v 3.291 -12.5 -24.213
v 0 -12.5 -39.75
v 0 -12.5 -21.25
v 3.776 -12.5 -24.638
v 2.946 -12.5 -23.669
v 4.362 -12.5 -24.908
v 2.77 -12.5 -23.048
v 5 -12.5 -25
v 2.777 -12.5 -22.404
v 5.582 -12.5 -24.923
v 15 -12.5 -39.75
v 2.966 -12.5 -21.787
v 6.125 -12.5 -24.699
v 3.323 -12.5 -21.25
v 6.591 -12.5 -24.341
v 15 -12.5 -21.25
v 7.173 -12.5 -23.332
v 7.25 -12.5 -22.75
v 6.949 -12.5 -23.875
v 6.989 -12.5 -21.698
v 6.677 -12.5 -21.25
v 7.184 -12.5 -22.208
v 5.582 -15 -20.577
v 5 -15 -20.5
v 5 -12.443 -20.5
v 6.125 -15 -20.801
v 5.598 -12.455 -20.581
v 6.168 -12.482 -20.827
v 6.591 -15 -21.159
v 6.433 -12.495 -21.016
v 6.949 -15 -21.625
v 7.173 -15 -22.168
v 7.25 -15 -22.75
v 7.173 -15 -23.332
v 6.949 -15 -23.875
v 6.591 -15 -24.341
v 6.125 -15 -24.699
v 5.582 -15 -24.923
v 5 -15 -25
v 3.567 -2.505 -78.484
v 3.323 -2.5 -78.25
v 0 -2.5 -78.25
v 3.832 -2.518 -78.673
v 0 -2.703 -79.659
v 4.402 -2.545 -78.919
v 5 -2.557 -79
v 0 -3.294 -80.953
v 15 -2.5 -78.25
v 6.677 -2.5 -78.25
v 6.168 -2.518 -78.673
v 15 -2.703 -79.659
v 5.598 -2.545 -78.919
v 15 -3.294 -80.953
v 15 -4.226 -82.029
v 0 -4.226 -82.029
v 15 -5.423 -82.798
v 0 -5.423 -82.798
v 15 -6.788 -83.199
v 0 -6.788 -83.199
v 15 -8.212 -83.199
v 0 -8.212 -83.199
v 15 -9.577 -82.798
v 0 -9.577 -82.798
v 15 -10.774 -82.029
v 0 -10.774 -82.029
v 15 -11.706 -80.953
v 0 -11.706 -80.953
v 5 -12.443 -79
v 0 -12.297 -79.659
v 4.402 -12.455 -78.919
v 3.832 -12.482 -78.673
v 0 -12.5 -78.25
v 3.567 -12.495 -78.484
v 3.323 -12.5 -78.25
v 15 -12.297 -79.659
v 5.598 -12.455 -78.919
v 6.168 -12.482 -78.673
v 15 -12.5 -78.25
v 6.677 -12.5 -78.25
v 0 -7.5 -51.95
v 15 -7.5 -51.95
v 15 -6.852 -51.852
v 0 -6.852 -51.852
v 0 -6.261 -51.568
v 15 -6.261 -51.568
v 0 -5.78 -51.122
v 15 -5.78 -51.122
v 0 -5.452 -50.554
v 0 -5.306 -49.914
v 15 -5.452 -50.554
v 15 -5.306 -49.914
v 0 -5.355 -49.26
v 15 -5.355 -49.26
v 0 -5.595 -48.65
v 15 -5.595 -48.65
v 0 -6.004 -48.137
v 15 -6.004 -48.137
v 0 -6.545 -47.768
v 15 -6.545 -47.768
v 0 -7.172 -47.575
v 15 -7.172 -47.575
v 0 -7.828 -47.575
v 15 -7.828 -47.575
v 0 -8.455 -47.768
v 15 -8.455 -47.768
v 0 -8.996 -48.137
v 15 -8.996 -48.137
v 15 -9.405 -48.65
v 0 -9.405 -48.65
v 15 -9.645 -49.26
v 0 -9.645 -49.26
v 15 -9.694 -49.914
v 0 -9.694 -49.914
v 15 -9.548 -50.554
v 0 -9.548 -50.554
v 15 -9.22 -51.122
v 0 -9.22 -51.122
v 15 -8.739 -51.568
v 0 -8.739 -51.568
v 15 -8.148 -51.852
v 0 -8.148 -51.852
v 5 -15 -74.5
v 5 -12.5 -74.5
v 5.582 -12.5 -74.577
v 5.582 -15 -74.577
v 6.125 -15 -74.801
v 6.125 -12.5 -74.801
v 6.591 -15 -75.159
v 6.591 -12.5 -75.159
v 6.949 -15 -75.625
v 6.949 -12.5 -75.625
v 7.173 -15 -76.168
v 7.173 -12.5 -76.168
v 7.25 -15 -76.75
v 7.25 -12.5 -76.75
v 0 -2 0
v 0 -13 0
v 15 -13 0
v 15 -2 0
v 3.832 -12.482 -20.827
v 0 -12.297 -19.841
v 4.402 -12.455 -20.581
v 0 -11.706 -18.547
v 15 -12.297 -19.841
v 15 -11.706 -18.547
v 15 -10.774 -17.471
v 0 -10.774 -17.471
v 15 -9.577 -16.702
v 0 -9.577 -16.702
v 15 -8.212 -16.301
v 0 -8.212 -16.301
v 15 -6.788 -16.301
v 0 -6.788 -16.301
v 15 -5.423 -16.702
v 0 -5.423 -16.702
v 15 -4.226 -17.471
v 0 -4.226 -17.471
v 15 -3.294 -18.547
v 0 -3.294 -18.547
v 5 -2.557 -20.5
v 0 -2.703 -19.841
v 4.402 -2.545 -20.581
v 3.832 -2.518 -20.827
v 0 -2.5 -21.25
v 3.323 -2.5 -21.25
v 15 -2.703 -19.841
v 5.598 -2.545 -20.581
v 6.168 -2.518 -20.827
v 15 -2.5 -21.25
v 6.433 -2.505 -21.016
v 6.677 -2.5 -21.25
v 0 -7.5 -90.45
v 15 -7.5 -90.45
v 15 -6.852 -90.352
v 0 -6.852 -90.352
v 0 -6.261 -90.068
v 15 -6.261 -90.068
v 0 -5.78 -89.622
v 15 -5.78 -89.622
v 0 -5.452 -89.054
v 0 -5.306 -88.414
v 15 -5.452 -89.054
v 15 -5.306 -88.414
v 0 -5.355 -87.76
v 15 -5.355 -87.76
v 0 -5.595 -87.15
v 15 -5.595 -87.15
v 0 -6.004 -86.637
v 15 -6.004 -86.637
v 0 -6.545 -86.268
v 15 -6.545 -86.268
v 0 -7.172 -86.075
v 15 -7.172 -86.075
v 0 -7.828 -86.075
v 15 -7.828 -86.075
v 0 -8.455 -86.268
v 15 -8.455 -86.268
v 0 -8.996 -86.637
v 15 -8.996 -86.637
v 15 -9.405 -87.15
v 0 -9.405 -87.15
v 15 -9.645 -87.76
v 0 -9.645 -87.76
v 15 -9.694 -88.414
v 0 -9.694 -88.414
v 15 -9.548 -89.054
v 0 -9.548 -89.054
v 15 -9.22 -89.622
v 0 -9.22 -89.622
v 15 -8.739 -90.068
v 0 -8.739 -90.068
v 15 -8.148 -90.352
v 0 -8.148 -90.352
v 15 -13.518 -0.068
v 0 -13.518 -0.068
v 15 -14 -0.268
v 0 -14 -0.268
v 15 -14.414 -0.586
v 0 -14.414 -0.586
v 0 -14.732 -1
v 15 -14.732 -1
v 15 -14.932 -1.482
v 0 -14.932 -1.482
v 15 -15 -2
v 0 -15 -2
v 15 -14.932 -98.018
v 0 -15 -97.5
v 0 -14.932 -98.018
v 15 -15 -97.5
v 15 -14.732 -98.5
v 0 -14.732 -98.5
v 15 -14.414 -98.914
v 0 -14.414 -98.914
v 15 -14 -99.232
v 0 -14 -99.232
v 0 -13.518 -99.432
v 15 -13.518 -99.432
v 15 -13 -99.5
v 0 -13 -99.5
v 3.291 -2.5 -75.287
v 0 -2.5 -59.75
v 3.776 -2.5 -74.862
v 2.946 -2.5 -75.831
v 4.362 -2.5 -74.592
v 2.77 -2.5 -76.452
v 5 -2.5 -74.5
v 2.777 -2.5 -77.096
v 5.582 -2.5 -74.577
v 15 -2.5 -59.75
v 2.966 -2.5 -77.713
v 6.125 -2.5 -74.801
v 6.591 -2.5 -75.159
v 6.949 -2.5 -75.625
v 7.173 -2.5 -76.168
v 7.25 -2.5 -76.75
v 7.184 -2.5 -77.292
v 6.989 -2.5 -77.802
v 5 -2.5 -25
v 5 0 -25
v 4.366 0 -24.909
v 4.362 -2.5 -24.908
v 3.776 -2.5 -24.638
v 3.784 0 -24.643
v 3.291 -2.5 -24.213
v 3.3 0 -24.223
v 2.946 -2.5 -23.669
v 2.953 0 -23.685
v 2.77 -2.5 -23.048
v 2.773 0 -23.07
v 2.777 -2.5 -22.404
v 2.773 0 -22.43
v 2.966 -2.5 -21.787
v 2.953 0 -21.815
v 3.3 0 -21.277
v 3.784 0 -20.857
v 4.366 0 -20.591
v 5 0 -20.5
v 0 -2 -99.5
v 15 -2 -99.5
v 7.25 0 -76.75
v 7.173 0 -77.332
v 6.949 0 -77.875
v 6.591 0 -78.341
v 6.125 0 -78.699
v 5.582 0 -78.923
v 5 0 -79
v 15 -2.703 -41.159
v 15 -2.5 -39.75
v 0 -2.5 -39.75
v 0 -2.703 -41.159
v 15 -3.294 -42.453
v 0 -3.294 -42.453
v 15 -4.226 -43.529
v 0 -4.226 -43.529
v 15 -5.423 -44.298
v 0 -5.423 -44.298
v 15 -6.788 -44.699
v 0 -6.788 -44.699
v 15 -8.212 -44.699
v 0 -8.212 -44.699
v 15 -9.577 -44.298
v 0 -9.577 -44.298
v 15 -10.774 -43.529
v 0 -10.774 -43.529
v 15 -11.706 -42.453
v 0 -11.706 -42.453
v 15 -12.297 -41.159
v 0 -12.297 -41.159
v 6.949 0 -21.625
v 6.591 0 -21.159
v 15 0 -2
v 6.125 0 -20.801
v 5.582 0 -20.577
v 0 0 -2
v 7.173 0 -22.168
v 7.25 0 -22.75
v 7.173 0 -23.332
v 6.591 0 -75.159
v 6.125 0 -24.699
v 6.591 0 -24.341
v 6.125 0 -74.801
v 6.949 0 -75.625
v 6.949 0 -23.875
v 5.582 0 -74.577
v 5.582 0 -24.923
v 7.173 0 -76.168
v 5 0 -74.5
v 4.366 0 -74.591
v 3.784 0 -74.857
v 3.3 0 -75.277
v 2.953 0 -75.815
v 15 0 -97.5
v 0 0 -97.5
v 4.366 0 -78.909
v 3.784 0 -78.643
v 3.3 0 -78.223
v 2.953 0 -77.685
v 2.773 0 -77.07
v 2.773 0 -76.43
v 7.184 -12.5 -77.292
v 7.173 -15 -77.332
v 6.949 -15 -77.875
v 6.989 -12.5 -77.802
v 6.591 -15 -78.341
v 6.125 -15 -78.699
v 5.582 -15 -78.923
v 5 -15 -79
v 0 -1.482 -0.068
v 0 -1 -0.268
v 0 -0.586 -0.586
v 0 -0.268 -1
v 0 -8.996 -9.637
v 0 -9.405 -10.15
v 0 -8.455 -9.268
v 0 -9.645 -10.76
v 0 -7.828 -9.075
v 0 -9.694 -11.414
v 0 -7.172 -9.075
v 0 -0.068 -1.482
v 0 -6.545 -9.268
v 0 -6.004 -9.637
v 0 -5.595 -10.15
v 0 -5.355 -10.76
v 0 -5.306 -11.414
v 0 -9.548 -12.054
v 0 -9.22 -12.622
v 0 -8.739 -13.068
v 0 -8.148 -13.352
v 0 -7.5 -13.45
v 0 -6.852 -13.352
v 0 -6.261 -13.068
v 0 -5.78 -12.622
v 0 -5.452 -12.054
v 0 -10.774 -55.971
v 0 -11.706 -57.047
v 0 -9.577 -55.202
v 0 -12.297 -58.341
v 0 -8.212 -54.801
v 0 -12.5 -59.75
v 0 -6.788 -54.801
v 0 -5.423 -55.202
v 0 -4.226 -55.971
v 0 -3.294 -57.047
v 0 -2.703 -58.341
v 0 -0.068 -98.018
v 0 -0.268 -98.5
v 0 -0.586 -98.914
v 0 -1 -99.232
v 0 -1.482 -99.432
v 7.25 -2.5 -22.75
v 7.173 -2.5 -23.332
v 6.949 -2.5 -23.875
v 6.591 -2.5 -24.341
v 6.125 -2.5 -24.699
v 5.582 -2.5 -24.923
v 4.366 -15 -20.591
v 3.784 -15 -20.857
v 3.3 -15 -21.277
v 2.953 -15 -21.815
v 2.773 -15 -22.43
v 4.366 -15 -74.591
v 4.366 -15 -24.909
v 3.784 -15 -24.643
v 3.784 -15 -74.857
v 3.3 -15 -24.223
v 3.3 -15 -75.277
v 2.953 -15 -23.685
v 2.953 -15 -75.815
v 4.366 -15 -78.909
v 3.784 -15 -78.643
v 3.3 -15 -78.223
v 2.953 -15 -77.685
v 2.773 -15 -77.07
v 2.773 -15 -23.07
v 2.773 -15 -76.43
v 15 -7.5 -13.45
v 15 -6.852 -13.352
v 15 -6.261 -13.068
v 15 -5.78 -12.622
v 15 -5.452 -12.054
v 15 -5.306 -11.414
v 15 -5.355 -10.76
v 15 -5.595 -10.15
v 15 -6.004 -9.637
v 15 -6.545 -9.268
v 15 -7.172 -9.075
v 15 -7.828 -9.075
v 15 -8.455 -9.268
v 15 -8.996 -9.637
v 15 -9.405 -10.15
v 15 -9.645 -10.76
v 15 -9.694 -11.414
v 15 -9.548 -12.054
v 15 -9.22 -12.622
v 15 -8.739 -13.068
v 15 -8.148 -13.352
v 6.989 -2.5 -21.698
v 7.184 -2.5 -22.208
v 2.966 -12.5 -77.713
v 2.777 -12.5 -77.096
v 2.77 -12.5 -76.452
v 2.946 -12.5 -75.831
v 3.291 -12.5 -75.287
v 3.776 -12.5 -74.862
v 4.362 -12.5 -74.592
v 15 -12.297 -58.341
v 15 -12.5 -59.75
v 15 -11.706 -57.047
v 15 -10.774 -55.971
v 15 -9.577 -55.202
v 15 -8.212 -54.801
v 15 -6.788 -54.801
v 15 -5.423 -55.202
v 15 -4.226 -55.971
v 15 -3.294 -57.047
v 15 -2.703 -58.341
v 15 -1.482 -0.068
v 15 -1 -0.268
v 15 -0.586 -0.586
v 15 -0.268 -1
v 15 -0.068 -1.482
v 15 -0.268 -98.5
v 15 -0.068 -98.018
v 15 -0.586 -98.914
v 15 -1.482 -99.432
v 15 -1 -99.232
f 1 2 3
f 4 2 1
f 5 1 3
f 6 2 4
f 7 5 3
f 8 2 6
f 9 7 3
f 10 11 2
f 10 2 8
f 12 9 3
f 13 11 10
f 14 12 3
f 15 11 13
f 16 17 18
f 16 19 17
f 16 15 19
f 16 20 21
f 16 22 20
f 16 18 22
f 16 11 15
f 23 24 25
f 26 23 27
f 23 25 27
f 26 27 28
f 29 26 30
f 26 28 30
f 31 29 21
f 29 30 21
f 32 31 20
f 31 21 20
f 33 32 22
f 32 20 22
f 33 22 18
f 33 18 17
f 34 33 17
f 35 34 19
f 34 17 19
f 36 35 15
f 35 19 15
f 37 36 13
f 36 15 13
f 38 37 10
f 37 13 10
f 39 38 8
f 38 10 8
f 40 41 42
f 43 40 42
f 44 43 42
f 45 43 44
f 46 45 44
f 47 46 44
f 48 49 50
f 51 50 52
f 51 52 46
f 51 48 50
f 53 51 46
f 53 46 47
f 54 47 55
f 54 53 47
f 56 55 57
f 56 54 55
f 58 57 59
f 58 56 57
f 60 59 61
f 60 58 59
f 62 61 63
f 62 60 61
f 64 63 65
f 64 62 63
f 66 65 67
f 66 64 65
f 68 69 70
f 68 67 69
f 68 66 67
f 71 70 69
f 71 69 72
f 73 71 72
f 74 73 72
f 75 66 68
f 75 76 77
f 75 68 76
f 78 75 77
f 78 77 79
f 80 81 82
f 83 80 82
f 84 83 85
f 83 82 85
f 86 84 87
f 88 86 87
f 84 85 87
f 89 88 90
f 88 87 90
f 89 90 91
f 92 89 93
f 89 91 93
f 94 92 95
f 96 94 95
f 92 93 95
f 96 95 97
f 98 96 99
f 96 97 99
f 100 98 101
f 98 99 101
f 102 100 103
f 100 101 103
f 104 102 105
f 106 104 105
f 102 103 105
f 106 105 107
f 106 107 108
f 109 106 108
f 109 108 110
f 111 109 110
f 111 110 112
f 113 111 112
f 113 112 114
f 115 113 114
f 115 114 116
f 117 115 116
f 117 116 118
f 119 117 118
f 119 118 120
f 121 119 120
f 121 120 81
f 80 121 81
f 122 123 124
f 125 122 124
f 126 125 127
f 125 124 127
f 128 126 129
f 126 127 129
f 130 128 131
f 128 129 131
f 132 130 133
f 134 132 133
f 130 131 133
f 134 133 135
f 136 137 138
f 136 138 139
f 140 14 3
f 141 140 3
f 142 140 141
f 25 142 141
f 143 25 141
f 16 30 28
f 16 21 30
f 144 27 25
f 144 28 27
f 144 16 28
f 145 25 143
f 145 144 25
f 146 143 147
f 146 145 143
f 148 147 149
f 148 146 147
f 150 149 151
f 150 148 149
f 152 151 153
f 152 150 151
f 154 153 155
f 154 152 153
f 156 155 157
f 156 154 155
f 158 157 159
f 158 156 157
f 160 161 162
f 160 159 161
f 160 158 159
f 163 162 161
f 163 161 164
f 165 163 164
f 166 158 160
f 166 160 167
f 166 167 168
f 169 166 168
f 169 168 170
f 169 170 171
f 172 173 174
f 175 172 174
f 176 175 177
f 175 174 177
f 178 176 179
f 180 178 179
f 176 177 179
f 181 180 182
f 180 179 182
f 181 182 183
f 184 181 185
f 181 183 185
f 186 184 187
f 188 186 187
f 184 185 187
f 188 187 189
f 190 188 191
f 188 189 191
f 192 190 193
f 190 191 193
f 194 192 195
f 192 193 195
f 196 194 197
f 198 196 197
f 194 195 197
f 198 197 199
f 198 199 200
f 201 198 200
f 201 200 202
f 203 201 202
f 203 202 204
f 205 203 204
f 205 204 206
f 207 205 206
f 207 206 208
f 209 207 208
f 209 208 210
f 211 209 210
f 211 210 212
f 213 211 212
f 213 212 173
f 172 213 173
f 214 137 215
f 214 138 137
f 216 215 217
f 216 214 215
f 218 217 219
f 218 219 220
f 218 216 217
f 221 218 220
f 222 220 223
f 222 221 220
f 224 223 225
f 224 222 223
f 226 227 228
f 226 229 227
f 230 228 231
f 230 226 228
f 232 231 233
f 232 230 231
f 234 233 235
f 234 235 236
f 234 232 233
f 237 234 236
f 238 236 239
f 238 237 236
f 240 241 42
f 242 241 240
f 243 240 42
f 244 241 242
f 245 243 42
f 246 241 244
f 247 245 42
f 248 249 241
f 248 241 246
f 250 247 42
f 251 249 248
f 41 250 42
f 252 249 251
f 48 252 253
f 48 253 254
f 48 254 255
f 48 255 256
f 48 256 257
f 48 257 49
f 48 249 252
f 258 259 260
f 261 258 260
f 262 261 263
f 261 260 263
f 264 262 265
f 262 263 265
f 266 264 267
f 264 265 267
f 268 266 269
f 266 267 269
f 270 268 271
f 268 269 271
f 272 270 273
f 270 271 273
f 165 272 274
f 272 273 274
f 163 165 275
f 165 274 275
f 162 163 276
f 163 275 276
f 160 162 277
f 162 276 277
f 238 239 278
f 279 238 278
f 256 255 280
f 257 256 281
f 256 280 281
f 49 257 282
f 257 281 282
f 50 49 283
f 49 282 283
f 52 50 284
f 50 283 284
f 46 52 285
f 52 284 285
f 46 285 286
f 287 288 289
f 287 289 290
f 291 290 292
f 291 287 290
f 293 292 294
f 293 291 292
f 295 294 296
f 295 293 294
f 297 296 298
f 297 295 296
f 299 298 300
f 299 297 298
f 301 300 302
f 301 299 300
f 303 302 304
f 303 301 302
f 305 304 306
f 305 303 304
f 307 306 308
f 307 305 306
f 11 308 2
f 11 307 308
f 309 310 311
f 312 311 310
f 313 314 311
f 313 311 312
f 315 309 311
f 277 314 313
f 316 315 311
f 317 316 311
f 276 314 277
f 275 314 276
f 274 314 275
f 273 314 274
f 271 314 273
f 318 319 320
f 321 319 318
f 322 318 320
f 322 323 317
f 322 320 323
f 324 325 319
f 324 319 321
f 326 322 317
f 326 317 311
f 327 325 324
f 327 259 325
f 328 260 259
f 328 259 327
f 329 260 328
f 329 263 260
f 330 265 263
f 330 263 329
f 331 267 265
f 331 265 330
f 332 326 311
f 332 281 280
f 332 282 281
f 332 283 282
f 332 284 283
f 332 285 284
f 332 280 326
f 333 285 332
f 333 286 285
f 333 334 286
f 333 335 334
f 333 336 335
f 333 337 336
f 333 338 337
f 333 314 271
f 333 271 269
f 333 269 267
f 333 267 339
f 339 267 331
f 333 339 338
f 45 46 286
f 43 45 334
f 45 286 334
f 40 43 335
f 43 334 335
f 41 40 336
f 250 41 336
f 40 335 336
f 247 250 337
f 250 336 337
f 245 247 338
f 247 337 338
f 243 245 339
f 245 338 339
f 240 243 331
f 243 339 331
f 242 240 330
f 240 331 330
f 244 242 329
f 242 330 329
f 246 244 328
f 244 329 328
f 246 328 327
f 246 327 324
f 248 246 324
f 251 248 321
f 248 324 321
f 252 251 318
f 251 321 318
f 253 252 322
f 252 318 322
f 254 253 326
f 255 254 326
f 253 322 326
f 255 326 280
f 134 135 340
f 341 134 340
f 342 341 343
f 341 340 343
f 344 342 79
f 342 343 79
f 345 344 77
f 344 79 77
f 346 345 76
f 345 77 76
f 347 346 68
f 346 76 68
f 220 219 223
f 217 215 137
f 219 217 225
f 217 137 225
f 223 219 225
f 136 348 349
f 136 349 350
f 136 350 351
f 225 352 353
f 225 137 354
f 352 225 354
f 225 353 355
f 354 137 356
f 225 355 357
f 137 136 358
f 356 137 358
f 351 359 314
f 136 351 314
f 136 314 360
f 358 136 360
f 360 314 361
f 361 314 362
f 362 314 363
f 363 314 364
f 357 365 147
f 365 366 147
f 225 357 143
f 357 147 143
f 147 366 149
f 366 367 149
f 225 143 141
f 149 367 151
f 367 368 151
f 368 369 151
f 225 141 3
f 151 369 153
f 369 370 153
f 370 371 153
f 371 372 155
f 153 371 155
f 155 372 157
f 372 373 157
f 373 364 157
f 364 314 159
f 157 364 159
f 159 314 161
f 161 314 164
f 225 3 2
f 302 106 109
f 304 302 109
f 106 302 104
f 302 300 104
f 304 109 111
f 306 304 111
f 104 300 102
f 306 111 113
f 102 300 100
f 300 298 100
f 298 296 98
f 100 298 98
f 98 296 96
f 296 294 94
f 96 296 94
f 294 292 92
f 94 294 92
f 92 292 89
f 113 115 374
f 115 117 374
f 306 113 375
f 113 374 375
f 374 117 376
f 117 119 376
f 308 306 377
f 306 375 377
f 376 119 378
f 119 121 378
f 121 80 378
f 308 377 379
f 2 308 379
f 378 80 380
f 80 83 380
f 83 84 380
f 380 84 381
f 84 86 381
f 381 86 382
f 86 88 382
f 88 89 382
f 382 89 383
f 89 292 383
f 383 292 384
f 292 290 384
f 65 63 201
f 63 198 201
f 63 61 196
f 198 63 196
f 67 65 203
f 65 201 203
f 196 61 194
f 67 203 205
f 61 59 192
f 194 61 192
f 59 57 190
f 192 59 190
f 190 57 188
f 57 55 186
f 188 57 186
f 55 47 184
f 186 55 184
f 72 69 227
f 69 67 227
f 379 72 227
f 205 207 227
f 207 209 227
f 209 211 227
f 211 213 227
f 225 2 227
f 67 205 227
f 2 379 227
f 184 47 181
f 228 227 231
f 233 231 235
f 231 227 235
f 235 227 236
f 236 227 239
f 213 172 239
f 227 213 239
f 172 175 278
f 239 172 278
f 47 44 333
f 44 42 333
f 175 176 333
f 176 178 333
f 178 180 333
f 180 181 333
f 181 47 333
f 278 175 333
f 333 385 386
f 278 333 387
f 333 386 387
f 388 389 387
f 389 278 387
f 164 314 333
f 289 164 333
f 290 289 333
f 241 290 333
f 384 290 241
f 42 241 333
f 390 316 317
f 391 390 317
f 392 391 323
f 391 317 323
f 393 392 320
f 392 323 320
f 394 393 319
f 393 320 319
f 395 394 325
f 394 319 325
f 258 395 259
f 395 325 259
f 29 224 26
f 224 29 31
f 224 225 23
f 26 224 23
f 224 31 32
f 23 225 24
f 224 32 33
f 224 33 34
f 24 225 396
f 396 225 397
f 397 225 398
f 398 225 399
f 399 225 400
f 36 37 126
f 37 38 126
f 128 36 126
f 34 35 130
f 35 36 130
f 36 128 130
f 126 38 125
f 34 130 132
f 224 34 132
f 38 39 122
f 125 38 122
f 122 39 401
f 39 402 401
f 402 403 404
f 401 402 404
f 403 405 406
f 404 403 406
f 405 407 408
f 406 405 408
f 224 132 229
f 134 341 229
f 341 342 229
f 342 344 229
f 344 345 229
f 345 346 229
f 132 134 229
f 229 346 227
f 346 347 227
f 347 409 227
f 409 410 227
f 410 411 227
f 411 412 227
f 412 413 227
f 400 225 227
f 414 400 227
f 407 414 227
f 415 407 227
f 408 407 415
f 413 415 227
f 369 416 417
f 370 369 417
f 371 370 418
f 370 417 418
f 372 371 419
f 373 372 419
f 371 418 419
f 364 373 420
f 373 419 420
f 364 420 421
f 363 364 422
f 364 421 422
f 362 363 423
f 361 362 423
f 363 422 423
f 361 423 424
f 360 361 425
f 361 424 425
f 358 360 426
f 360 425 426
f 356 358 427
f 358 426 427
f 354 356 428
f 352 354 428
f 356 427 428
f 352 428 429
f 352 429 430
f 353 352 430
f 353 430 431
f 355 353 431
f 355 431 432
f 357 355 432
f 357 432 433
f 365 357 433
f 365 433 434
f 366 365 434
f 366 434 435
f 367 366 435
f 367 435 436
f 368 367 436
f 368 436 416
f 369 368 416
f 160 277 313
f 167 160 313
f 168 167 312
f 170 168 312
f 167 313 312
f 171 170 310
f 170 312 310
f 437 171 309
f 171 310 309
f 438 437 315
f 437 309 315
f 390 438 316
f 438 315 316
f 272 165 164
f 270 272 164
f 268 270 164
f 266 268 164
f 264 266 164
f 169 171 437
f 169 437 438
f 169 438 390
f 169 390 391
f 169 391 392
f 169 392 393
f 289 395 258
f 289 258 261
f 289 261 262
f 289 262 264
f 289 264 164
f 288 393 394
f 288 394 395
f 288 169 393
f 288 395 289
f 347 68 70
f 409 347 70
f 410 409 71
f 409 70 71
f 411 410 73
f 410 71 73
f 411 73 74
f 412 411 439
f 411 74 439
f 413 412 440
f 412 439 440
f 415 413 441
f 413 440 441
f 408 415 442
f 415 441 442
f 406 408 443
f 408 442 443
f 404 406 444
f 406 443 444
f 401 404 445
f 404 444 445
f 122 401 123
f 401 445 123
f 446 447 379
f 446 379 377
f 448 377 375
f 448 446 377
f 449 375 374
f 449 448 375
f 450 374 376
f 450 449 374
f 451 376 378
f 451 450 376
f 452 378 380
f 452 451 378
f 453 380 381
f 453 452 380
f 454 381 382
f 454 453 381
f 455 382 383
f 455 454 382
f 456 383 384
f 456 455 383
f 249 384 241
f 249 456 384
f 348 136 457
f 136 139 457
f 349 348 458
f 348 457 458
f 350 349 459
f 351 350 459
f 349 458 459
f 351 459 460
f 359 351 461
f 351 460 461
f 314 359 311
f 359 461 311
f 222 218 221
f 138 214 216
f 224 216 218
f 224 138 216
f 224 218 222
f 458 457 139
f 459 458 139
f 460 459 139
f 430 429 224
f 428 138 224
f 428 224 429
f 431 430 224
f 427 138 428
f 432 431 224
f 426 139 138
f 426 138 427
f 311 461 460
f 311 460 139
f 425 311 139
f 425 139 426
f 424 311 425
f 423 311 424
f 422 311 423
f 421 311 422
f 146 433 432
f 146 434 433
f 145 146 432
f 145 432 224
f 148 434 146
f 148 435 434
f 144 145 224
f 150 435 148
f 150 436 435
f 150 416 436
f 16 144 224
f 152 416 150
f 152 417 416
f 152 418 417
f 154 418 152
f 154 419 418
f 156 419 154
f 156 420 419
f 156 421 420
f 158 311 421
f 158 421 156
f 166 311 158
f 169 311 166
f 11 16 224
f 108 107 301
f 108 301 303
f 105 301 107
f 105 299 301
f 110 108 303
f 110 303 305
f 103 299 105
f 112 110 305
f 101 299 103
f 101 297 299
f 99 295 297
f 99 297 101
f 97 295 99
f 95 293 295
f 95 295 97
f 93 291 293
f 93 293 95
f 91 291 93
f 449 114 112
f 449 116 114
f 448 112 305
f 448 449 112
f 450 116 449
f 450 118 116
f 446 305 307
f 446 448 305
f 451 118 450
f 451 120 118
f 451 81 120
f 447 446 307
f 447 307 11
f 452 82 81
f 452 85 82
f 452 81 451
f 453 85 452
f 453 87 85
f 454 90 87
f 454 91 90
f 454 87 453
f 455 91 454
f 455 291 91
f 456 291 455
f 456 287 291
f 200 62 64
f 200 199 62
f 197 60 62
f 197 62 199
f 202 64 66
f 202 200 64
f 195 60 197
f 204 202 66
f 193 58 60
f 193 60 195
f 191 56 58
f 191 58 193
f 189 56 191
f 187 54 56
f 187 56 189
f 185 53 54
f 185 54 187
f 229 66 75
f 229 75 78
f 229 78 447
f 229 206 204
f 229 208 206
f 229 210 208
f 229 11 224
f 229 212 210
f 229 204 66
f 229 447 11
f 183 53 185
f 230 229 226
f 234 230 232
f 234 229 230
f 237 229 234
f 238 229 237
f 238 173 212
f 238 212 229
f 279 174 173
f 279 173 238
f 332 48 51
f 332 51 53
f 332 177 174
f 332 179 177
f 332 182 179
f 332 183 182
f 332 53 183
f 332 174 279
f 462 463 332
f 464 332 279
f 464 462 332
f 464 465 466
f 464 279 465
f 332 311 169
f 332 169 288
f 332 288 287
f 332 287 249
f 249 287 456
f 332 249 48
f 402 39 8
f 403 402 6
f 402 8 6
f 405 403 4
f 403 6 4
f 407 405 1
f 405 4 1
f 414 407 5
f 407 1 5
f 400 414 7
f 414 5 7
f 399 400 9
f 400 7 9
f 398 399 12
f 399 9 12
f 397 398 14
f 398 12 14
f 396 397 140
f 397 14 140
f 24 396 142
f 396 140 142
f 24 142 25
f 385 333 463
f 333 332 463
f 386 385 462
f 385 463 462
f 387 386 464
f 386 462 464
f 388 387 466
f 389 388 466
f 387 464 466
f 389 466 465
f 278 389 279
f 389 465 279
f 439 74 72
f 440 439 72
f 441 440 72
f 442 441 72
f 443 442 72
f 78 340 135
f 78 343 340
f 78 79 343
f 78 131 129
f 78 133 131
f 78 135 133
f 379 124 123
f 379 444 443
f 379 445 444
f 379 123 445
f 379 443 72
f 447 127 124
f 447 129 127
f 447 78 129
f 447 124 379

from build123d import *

# Parameters (mm, degrees)
SKETCH_1_W          = 99.5
SKETCH_1_H          = 15
EXTRUDE_1_DEPTH     = 15
SKETCH_2_R          = 2.2
CUT_EXTRUDE_1_DEPTH = 55
CUT_EXTRUDE_2_DEPTH = 48
FILLET_1_R          = 2
CUT_EXTRUDE_3_DEPTH = 31


with BuildPart() as part:
    # 草图1 → 凸台-拉伸1 (new body)
    with BuildSketch(Plane(origin=(0, 0, 0), x_dir=(0, 0, -1), z_dir=(1, 0, 0))):
        with Locations((49.75, -7.5)):
            Rectangle(SKETCH_1_W, SKETCH_1_H)
    extrude(amount=EXTRUDE_1_DEPTH)

    # 草图2 → 切除-拉伸1 (cut)
    with BuildSketch(Plane(origin=(15, 0, 0), x_dir=(0, 0, -1), z_dir=(1, 0, 0))):
        with Locations((49.75, -7.5)):
            Circle(SKETCH_2_R)
        with Locations((11.25, -7.5)):
            Circle(SKETCH_2_R)
        with Locations((88.25, -7.5)):
            Circle(SKETCH_2_R)
    extrude(amount=-CUT_EXTRUDE_1_DEPTH, mode=Mode.SUBTRACT)

    # 草图3 → 切除-拉伸2 (cut)
    with BuildSketch(Plane(origin=(15, 0, 0), x_dir=(0, 0, -1), z_dir=(1, 0, 0))):
        with BuildLine():
            Line((21.25, -2.5), (39.75, -2.5))
            ThreePointArc((39.75, -2.5), (44.75, -7.5), (39.75, -12.5))
            Line((39.75, -12.5), (21.25, -12.5))
            ThreePointArc((21.25, -12.5), (16.25, -7.5), (21.25, -2.5))
        make_face()
        with BuildLine():
            Line((59.75, -2.5), (78.25, -2.5))
            ThreePointArc((78.25, -2.5), (83.25, -7.5), (78.25, -12.5))
            Line((78.25, -12.5), (59.75, -12.5))
            ThreePointArc((59.75, -12.5), (54.75, -7.5), (59.75, -2.5))
        make_face()
    extrude(amount=-CUT_EXTRUDE_2_DEPTH, mode=Mode.SUBTRACT)

    # 圆角1
    fillet_1_edges = [part.edges().sort_by_distance(p)[0] for p in [
        (7.5, 0, 0),
        (7.5, 0, -99.5),
        (7.5, -15, -99.5),
        (7.5, -15, 0),
    ]]
    fillet(fillet_1_edges, radius=FILLET_1_R)

    # 草图4 → 切除-拉伸3 (cut)
    with BuildSketch(Plane(origin=(0, 0, 0), x_dir=(1, 0, 0), z_dir=(0, 1, 0))):
        with BuildLine():
            ThreePointArc((7.25, 22.75), (6.590990258, 24.340990258), (5, 25))
            Line((5, 25), (5, 20.5))
            ThreePointArc((5, 20.5), (6.590990258, 21.159009742), (7.25, 22.75))
        make_face()
        with BuildLine():
            Line((5, 20.5), (5, 25))
            ThreePointArc((5, 25), (2.75, 22.75), (5, 20.5))
        make_face()
        with BuildLine():
            ThreePointArc((7.25, 76.75), (6.590990258, 78.340990258), (5, 79))
            Line((5, 79), (5, 74.5))
            ThreePointArc((5, 74.5), (6.590990258, 75.159009742), (7.25, 76.75))
        make_face()
        with BuildLine():
            Line((5, 74.5), (5, 79))
            ThreePointArc((5, 79), (2.75, 76.75), (5, 74.5))
        make_face()
    extrude(amount=-CUT_EXTRUDE_3_DEPTH, mode=Mode.SUBTRACT)


solid = part.part
